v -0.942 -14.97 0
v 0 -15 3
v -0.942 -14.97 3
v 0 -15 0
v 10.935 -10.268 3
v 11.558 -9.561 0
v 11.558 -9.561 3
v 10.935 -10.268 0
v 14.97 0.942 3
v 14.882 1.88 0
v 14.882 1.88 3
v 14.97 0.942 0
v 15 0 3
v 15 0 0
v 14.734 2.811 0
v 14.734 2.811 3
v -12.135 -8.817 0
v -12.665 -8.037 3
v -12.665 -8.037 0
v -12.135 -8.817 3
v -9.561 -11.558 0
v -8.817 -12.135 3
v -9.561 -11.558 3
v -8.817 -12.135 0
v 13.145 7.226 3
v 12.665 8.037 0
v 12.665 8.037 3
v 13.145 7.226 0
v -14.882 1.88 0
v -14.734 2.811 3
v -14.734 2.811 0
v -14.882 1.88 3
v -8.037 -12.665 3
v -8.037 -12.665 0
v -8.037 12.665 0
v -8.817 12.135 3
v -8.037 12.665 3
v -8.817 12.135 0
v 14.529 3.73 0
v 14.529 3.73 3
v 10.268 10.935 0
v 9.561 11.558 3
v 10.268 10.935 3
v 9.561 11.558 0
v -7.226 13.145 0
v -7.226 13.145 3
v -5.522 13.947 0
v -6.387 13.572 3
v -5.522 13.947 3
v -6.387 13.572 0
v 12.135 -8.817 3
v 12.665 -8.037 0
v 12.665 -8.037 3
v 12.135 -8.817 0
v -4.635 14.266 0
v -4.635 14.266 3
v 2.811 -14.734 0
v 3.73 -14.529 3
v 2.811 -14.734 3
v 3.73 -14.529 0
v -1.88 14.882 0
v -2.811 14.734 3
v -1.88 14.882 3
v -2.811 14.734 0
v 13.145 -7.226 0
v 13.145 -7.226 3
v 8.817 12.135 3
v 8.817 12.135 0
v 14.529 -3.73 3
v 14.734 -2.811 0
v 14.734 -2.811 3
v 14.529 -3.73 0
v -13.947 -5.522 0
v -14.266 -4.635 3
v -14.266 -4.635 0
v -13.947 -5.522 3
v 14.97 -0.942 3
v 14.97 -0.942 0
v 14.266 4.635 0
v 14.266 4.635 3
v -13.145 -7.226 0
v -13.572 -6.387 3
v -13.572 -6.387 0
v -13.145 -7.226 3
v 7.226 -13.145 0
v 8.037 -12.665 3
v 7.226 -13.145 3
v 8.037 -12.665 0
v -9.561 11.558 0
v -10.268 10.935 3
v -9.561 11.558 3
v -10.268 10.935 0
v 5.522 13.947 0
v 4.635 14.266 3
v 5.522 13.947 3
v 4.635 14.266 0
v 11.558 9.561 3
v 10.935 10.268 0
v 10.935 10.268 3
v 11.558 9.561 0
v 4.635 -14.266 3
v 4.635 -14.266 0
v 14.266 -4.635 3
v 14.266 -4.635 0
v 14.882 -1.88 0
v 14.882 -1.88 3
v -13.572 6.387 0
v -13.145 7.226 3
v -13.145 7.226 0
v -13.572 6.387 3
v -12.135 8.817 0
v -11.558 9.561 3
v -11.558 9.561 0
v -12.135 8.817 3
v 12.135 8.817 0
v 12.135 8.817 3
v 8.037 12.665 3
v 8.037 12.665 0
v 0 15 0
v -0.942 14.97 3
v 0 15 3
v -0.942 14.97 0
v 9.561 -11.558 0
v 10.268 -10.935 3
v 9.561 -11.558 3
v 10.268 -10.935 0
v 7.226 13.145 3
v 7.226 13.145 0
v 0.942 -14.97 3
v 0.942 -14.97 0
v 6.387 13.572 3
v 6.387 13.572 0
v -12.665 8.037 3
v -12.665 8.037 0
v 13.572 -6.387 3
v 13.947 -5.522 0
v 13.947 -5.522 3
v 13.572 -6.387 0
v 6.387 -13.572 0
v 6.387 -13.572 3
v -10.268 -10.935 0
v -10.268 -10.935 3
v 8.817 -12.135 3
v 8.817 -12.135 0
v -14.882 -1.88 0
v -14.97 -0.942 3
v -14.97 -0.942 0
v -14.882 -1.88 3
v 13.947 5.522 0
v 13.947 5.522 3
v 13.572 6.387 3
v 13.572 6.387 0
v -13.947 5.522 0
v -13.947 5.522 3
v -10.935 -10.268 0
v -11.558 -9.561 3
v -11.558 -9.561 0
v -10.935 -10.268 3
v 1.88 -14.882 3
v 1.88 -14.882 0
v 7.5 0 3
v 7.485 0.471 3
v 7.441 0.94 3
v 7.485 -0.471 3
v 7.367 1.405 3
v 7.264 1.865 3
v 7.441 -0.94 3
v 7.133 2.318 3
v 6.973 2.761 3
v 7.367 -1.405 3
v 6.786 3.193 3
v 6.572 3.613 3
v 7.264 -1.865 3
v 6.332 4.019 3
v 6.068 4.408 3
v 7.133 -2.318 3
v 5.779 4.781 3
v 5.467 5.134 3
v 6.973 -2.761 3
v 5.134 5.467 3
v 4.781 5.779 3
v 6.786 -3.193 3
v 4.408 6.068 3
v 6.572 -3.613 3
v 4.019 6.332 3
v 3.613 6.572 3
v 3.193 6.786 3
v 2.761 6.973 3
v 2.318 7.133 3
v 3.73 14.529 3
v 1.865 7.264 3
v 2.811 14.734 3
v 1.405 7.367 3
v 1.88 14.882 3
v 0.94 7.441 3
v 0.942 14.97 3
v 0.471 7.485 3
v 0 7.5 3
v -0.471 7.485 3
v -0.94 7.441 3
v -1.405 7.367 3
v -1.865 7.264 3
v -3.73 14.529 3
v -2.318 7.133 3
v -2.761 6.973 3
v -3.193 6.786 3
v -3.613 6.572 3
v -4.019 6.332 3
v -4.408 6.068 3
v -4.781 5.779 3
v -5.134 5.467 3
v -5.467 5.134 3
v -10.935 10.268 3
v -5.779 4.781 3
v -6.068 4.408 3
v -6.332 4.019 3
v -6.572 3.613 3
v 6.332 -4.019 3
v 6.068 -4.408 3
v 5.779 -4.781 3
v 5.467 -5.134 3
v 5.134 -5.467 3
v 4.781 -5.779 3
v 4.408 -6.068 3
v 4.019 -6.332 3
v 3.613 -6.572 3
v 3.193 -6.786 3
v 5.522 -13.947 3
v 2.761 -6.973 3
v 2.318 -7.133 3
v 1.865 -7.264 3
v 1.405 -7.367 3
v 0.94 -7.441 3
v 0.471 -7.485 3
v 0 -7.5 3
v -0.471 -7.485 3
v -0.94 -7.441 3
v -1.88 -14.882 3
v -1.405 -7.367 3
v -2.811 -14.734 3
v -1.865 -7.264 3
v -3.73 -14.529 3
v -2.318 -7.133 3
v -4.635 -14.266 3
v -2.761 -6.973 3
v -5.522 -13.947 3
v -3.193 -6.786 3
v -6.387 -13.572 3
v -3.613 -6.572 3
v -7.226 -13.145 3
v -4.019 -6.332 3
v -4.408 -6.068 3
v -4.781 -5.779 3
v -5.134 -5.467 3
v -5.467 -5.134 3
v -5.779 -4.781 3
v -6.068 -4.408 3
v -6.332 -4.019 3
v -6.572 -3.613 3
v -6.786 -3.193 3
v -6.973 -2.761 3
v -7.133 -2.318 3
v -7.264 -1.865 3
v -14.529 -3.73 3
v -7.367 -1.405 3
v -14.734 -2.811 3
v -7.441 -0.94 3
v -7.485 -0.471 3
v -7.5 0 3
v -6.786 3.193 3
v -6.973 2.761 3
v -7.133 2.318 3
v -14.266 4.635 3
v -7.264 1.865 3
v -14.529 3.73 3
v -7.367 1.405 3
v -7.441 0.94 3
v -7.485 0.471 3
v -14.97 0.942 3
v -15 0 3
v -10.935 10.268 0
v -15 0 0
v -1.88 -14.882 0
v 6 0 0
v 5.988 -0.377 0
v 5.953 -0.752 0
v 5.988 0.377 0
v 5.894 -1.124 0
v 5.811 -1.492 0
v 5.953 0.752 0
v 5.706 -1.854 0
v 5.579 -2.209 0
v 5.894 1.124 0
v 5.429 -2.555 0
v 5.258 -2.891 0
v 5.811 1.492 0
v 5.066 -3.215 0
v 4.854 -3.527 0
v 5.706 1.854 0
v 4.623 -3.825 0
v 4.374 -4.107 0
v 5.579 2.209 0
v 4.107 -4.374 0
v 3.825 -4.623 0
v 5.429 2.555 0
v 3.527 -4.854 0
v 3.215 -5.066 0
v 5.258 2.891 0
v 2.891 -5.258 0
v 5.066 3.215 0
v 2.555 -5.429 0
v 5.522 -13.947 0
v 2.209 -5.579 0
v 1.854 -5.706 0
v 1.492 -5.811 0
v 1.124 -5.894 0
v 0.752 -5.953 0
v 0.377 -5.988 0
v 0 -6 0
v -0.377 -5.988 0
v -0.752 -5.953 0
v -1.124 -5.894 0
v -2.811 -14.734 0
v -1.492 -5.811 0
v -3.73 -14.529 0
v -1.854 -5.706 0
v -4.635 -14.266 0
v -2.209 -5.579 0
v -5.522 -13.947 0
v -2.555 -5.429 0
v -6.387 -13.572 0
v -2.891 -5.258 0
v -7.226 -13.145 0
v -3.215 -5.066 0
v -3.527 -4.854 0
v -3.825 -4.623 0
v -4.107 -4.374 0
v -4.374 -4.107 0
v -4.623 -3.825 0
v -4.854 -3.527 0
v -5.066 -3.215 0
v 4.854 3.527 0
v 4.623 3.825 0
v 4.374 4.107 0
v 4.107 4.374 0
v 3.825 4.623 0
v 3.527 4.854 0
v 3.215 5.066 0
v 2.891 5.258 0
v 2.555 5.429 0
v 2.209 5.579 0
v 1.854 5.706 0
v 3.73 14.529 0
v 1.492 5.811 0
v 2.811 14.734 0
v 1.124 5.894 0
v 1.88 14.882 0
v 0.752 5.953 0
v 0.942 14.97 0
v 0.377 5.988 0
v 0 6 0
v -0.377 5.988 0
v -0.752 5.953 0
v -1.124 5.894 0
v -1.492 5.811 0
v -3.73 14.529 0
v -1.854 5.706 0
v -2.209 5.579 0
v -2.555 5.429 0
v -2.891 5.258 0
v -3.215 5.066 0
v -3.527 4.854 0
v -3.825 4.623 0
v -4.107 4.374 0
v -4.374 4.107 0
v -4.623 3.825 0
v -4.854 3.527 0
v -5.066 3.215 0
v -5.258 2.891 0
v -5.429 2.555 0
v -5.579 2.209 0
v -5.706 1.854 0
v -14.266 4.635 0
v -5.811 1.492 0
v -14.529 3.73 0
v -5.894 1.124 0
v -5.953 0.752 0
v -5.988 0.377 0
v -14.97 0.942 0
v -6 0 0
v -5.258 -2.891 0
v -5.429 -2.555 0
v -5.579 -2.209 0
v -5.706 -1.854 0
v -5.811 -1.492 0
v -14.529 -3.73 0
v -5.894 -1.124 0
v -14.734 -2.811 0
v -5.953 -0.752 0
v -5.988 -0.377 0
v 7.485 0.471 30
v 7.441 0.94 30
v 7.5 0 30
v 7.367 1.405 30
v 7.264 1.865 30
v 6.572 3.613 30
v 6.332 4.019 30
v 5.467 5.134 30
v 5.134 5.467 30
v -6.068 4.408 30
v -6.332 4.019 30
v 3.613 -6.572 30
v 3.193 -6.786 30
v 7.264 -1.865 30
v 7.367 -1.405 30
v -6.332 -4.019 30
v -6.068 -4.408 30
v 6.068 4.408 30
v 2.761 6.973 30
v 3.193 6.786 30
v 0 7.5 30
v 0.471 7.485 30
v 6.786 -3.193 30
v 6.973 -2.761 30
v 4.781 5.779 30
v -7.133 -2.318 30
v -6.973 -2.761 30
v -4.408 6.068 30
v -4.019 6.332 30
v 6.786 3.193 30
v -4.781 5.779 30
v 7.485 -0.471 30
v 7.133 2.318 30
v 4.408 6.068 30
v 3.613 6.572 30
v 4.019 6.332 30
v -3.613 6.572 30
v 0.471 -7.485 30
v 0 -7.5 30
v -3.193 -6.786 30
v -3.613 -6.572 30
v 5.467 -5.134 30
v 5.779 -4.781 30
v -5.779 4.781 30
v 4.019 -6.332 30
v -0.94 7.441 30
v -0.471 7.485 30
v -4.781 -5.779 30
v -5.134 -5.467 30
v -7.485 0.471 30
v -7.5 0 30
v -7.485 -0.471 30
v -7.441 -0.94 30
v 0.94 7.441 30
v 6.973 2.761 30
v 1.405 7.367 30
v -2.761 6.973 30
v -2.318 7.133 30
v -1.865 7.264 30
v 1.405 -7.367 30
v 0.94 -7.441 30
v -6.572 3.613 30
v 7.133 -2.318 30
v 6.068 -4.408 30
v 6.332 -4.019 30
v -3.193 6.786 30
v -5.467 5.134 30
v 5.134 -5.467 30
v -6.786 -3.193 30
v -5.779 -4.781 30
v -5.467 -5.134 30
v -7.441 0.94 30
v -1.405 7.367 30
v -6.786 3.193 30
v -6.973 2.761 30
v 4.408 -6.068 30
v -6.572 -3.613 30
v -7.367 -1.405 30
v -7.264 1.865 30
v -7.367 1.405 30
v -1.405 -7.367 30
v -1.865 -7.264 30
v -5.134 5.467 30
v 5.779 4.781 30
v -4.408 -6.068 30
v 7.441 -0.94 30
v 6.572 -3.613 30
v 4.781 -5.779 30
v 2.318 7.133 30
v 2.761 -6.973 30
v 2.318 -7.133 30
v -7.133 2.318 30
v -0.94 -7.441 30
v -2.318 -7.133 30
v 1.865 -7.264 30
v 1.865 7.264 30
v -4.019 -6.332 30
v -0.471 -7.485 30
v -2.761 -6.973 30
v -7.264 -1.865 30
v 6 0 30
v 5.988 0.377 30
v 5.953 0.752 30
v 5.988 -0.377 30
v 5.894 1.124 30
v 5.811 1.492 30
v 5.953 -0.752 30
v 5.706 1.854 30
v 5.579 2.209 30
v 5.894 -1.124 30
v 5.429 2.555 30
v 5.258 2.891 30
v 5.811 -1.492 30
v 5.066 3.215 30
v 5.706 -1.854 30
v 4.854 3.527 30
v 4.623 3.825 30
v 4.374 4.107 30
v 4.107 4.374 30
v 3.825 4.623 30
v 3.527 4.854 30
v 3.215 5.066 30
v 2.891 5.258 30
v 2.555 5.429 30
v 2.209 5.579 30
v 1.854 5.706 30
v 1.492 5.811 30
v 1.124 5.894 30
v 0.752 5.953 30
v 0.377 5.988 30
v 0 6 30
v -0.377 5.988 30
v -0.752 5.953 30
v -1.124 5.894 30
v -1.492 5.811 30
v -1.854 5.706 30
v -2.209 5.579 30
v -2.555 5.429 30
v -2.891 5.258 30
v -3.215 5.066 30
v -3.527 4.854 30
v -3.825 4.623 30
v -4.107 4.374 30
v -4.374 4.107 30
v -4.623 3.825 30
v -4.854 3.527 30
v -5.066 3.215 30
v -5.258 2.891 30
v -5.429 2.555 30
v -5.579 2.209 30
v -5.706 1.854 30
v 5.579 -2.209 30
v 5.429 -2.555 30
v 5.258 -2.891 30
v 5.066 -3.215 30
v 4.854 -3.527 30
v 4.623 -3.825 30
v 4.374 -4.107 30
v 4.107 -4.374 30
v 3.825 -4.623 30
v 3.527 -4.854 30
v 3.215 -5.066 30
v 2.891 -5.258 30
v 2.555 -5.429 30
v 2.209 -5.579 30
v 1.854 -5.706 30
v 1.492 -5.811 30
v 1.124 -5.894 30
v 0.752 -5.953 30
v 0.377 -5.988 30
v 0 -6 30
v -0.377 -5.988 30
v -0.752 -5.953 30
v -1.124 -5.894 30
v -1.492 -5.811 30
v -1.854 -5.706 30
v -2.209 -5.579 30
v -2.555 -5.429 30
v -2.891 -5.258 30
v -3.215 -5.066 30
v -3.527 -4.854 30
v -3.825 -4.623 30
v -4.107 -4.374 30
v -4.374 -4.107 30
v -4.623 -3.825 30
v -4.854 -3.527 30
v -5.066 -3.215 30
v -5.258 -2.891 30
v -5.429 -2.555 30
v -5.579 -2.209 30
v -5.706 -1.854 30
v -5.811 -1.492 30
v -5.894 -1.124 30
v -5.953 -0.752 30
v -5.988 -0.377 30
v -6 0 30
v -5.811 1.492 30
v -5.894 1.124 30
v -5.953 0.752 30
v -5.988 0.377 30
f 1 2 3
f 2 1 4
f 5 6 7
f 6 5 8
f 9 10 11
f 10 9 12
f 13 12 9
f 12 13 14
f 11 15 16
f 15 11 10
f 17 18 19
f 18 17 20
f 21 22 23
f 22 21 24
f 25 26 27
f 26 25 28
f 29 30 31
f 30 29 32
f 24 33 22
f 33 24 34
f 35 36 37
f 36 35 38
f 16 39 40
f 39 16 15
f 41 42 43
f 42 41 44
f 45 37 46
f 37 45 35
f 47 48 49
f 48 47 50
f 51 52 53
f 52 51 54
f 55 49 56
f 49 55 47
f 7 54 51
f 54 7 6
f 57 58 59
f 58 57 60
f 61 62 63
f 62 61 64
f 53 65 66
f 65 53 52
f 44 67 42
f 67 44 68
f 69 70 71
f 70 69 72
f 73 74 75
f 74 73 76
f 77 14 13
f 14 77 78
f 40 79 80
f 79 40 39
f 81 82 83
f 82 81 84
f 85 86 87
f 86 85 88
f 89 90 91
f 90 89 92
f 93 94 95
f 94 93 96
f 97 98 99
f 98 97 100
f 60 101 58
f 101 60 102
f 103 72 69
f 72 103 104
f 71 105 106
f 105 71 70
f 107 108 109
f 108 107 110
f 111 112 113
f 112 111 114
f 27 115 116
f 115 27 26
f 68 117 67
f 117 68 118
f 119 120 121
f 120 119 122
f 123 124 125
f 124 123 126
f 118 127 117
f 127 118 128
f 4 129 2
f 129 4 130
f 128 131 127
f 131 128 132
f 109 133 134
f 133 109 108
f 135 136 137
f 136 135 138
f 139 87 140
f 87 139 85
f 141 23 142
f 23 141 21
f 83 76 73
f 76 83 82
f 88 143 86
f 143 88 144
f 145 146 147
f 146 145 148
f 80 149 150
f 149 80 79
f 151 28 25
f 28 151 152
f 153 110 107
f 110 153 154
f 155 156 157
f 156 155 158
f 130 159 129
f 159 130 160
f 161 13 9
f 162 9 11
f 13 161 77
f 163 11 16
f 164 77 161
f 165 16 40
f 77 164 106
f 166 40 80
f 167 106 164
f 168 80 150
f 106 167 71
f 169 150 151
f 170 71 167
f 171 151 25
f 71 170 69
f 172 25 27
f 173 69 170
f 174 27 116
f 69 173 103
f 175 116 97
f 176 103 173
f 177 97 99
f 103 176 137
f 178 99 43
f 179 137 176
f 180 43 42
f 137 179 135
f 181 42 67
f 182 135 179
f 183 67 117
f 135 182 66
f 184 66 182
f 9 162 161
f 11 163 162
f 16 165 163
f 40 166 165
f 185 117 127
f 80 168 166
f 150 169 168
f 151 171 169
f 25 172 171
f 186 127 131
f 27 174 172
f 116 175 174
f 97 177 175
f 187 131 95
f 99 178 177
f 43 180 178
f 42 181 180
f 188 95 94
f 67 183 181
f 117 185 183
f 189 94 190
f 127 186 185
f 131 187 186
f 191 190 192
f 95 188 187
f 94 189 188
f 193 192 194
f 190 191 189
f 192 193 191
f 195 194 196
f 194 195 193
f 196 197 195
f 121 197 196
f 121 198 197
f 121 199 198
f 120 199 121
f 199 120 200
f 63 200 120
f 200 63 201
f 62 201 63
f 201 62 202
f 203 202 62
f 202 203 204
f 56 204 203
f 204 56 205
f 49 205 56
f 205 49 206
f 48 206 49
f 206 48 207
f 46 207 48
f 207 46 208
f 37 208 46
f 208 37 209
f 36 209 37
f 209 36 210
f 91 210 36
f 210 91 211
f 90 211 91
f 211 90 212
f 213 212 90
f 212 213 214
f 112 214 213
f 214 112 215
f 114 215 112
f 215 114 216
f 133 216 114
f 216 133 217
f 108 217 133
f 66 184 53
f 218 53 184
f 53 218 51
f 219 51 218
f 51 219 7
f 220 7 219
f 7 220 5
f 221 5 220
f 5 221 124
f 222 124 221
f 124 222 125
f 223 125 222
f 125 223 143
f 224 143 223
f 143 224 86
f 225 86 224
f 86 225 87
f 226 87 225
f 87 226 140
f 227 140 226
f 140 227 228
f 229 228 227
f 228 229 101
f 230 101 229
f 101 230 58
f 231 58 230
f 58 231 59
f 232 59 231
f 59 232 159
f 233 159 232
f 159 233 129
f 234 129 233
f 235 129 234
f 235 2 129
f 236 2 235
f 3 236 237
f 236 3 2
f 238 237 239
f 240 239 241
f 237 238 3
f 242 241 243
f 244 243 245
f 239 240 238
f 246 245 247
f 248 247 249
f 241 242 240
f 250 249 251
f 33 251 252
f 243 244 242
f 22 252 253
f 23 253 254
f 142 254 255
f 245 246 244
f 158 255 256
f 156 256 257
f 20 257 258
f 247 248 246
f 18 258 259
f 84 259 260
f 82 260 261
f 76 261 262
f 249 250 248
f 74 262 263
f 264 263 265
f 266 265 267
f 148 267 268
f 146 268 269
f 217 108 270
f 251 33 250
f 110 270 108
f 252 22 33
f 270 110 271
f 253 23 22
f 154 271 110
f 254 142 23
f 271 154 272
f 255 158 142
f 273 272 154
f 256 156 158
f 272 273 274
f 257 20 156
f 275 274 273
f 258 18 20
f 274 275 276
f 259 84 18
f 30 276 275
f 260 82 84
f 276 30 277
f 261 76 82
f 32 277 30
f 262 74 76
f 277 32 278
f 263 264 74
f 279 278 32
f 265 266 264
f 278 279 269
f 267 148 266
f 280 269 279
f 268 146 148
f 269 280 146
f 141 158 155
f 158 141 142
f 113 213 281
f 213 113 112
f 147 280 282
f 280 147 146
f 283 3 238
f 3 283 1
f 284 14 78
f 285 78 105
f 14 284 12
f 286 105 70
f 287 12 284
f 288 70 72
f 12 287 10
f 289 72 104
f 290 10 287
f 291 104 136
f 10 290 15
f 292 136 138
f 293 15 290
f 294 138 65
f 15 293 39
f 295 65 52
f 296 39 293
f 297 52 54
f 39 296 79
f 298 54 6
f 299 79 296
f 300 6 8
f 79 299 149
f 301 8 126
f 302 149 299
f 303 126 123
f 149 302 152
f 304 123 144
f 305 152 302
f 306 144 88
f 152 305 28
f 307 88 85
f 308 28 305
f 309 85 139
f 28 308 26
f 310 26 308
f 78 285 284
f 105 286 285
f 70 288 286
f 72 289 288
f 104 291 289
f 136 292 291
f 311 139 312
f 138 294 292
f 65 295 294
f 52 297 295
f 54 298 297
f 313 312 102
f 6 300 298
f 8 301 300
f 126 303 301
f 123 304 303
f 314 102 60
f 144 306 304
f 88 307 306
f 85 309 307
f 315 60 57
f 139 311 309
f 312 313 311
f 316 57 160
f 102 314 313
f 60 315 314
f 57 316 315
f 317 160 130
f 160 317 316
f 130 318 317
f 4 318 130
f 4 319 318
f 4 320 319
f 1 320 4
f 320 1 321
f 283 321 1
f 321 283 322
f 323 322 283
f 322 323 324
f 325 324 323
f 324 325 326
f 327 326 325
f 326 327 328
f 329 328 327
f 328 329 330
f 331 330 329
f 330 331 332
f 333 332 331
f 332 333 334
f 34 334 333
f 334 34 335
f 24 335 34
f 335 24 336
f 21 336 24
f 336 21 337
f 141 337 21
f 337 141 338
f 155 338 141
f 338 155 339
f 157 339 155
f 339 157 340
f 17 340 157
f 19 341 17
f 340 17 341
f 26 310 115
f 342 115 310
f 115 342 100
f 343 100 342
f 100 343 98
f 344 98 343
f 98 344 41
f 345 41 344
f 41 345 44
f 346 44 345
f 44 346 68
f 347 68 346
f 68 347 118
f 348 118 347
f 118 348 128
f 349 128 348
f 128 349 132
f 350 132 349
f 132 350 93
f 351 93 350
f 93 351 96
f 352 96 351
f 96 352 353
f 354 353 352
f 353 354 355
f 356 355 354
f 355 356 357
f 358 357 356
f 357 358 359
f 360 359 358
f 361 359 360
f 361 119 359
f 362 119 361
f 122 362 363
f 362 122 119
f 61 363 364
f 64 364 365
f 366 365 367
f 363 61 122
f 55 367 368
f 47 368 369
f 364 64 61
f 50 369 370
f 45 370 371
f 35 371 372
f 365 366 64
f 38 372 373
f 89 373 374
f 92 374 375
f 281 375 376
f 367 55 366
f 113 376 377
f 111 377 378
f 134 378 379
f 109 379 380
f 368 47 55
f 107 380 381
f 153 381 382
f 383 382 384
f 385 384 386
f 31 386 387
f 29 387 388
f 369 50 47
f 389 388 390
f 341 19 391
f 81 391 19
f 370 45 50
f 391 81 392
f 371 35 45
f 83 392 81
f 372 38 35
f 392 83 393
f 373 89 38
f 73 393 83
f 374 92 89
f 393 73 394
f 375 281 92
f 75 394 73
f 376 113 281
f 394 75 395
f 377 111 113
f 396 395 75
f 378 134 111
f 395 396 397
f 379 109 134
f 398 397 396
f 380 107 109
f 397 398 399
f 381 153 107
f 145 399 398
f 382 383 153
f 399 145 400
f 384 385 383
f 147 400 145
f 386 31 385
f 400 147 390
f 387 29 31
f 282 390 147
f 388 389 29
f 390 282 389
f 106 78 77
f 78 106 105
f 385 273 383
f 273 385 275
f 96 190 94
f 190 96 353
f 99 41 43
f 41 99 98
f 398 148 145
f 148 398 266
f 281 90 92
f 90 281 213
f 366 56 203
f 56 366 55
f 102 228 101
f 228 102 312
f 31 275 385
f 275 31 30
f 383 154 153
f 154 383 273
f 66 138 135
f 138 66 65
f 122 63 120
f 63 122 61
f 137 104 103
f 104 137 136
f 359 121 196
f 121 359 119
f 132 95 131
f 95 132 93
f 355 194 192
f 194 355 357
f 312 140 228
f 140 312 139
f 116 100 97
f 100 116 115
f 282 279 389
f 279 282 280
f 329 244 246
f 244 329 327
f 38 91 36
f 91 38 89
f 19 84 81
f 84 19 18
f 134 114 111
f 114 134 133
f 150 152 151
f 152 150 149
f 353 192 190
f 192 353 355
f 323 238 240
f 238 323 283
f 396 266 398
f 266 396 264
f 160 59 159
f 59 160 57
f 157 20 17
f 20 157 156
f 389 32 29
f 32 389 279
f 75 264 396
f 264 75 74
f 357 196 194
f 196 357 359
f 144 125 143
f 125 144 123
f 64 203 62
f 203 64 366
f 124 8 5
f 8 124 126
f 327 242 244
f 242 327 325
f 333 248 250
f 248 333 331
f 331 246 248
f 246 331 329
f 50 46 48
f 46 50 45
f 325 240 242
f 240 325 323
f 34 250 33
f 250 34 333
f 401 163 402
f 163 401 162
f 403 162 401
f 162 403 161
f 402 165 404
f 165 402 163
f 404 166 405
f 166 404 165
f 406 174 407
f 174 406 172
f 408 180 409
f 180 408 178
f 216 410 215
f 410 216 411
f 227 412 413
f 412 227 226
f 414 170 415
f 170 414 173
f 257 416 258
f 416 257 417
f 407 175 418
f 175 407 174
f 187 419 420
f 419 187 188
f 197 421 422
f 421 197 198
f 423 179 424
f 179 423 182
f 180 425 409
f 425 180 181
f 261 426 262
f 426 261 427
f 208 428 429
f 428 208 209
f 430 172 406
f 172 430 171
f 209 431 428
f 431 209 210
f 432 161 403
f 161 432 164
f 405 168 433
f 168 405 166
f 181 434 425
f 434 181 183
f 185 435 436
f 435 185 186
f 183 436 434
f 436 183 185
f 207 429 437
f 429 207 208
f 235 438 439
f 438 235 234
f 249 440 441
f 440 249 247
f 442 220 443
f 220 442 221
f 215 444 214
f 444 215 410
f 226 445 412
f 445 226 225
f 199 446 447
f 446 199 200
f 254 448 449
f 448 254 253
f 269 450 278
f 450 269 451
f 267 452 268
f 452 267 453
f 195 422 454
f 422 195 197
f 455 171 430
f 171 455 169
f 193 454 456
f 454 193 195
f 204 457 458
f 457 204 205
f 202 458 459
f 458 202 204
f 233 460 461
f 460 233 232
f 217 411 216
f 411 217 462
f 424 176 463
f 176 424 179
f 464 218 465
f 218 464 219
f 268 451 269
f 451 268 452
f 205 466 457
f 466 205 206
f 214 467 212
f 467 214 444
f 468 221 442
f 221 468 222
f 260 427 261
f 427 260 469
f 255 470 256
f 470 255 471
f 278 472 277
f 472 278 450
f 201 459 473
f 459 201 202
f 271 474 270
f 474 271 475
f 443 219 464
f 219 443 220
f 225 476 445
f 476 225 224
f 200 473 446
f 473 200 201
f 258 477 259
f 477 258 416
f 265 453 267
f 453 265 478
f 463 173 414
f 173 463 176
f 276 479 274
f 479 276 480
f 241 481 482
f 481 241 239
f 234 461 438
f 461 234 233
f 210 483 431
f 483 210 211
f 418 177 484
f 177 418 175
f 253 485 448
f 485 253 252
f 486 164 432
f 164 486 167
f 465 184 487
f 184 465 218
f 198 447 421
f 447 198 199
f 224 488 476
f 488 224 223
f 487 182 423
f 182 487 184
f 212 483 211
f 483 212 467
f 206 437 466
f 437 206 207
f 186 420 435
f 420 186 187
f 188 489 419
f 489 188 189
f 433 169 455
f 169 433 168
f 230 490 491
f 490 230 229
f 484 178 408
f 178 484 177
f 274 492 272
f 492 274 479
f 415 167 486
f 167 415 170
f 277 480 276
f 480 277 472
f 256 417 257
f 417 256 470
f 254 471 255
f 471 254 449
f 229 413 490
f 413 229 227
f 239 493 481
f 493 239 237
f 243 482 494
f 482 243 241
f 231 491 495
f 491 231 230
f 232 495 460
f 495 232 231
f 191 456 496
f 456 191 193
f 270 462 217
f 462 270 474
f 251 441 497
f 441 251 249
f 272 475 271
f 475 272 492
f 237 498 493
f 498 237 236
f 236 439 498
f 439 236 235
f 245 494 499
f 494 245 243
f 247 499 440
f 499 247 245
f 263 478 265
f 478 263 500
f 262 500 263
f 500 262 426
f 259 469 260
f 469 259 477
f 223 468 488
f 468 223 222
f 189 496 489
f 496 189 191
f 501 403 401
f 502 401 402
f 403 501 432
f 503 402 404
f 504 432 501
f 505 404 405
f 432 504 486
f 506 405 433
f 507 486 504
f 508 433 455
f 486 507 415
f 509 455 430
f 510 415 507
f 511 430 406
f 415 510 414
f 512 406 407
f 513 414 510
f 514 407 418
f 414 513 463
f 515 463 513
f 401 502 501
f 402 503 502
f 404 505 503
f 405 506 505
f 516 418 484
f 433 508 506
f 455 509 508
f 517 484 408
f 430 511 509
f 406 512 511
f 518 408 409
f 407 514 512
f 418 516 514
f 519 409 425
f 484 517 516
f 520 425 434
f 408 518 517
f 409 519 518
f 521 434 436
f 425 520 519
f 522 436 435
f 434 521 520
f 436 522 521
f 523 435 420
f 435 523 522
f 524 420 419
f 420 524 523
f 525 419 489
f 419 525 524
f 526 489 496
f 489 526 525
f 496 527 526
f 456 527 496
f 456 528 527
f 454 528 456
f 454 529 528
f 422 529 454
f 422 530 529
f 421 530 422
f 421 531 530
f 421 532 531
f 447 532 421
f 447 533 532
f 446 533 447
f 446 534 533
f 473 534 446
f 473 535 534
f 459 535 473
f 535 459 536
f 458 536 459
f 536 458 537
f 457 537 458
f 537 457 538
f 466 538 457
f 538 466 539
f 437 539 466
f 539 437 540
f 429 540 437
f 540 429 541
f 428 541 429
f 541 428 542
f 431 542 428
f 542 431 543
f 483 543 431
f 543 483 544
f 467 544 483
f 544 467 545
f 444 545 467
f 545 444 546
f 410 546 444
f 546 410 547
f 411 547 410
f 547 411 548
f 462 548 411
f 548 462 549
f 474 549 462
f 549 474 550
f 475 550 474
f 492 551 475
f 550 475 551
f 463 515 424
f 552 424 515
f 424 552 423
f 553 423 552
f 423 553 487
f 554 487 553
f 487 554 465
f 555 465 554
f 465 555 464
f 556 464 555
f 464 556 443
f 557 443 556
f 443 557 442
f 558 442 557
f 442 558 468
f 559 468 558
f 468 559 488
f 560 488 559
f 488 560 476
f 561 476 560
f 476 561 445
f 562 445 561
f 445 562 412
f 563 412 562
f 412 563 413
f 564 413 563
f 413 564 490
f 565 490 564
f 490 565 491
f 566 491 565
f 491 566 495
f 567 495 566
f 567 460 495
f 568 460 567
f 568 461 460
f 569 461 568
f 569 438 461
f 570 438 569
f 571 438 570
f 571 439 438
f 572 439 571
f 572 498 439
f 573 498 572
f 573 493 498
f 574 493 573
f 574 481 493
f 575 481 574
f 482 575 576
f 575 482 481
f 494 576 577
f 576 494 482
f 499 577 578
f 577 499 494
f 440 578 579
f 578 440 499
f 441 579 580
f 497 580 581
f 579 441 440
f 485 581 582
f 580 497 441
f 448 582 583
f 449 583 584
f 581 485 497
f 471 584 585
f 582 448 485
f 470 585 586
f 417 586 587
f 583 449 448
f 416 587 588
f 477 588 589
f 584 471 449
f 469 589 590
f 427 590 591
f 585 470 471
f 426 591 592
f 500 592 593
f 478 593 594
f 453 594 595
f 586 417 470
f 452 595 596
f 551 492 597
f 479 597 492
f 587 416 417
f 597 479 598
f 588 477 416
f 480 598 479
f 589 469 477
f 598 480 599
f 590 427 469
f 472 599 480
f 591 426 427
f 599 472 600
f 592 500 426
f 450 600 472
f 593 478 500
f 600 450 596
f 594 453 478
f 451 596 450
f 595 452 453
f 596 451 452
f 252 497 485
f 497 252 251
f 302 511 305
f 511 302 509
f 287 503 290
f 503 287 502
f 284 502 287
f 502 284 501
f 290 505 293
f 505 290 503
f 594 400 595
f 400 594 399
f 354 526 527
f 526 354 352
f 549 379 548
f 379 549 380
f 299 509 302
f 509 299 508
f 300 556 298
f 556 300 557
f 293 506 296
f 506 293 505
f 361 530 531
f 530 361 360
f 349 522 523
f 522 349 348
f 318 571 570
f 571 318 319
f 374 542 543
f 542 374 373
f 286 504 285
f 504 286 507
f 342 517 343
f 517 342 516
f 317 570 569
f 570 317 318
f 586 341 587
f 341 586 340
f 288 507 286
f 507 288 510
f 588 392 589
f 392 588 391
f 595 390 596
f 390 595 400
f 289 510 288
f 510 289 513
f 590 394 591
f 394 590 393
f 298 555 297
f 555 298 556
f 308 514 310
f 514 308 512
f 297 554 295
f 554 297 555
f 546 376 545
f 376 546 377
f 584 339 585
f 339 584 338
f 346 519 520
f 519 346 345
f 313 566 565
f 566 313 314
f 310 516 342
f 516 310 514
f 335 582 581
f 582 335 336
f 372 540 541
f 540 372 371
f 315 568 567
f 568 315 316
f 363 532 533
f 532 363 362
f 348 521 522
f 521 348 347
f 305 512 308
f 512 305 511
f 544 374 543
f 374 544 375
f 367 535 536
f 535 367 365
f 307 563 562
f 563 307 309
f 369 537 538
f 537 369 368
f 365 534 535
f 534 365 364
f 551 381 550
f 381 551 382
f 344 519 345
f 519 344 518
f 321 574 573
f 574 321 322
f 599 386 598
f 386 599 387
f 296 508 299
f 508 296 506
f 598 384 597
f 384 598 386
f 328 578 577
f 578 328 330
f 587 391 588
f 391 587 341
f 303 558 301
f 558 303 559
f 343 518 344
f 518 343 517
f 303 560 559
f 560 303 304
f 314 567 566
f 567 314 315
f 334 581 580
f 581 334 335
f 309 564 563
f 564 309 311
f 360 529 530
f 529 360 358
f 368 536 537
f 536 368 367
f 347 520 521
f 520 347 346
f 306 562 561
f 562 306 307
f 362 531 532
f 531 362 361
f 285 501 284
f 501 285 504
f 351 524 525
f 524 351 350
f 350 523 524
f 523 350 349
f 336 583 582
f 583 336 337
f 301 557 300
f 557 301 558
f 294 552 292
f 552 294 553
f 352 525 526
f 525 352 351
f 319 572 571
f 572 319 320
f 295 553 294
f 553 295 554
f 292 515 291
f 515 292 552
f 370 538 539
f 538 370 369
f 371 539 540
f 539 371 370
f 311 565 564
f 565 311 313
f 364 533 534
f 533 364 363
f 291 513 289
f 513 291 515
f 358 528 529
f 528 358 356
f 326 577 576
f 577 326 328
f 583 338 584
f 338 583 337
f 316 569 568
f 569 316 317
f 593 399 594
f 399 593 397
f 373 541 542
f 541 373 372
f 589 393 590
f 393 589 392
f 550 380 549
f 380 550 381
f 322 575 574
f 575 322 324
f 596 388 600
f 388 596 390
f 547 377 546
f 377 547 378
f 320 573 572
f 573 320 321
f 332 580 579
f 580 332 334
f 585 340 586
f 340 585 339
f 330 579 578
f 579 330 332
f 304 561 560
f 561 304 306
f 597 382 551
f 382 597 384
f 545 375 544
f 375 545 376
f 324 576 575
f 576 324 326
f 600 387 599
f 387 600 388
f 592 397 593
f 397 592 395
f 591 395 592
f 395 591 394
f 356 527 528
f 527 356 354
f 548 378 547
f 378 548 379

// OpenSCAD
$fn=100;

innerD = 12;
outerD = 15;
rodH = 30;
capH = 3;

difference() {
    union() {
        cylinder(capH, outerD, outerD);
        cylinder(rodH, outerD/2, outerD/2);
    }
    
    translate([0, 0, -rodH/2]) {
        cylinder(rodH*3, innerD/2, innerD/2);
    }
} 
